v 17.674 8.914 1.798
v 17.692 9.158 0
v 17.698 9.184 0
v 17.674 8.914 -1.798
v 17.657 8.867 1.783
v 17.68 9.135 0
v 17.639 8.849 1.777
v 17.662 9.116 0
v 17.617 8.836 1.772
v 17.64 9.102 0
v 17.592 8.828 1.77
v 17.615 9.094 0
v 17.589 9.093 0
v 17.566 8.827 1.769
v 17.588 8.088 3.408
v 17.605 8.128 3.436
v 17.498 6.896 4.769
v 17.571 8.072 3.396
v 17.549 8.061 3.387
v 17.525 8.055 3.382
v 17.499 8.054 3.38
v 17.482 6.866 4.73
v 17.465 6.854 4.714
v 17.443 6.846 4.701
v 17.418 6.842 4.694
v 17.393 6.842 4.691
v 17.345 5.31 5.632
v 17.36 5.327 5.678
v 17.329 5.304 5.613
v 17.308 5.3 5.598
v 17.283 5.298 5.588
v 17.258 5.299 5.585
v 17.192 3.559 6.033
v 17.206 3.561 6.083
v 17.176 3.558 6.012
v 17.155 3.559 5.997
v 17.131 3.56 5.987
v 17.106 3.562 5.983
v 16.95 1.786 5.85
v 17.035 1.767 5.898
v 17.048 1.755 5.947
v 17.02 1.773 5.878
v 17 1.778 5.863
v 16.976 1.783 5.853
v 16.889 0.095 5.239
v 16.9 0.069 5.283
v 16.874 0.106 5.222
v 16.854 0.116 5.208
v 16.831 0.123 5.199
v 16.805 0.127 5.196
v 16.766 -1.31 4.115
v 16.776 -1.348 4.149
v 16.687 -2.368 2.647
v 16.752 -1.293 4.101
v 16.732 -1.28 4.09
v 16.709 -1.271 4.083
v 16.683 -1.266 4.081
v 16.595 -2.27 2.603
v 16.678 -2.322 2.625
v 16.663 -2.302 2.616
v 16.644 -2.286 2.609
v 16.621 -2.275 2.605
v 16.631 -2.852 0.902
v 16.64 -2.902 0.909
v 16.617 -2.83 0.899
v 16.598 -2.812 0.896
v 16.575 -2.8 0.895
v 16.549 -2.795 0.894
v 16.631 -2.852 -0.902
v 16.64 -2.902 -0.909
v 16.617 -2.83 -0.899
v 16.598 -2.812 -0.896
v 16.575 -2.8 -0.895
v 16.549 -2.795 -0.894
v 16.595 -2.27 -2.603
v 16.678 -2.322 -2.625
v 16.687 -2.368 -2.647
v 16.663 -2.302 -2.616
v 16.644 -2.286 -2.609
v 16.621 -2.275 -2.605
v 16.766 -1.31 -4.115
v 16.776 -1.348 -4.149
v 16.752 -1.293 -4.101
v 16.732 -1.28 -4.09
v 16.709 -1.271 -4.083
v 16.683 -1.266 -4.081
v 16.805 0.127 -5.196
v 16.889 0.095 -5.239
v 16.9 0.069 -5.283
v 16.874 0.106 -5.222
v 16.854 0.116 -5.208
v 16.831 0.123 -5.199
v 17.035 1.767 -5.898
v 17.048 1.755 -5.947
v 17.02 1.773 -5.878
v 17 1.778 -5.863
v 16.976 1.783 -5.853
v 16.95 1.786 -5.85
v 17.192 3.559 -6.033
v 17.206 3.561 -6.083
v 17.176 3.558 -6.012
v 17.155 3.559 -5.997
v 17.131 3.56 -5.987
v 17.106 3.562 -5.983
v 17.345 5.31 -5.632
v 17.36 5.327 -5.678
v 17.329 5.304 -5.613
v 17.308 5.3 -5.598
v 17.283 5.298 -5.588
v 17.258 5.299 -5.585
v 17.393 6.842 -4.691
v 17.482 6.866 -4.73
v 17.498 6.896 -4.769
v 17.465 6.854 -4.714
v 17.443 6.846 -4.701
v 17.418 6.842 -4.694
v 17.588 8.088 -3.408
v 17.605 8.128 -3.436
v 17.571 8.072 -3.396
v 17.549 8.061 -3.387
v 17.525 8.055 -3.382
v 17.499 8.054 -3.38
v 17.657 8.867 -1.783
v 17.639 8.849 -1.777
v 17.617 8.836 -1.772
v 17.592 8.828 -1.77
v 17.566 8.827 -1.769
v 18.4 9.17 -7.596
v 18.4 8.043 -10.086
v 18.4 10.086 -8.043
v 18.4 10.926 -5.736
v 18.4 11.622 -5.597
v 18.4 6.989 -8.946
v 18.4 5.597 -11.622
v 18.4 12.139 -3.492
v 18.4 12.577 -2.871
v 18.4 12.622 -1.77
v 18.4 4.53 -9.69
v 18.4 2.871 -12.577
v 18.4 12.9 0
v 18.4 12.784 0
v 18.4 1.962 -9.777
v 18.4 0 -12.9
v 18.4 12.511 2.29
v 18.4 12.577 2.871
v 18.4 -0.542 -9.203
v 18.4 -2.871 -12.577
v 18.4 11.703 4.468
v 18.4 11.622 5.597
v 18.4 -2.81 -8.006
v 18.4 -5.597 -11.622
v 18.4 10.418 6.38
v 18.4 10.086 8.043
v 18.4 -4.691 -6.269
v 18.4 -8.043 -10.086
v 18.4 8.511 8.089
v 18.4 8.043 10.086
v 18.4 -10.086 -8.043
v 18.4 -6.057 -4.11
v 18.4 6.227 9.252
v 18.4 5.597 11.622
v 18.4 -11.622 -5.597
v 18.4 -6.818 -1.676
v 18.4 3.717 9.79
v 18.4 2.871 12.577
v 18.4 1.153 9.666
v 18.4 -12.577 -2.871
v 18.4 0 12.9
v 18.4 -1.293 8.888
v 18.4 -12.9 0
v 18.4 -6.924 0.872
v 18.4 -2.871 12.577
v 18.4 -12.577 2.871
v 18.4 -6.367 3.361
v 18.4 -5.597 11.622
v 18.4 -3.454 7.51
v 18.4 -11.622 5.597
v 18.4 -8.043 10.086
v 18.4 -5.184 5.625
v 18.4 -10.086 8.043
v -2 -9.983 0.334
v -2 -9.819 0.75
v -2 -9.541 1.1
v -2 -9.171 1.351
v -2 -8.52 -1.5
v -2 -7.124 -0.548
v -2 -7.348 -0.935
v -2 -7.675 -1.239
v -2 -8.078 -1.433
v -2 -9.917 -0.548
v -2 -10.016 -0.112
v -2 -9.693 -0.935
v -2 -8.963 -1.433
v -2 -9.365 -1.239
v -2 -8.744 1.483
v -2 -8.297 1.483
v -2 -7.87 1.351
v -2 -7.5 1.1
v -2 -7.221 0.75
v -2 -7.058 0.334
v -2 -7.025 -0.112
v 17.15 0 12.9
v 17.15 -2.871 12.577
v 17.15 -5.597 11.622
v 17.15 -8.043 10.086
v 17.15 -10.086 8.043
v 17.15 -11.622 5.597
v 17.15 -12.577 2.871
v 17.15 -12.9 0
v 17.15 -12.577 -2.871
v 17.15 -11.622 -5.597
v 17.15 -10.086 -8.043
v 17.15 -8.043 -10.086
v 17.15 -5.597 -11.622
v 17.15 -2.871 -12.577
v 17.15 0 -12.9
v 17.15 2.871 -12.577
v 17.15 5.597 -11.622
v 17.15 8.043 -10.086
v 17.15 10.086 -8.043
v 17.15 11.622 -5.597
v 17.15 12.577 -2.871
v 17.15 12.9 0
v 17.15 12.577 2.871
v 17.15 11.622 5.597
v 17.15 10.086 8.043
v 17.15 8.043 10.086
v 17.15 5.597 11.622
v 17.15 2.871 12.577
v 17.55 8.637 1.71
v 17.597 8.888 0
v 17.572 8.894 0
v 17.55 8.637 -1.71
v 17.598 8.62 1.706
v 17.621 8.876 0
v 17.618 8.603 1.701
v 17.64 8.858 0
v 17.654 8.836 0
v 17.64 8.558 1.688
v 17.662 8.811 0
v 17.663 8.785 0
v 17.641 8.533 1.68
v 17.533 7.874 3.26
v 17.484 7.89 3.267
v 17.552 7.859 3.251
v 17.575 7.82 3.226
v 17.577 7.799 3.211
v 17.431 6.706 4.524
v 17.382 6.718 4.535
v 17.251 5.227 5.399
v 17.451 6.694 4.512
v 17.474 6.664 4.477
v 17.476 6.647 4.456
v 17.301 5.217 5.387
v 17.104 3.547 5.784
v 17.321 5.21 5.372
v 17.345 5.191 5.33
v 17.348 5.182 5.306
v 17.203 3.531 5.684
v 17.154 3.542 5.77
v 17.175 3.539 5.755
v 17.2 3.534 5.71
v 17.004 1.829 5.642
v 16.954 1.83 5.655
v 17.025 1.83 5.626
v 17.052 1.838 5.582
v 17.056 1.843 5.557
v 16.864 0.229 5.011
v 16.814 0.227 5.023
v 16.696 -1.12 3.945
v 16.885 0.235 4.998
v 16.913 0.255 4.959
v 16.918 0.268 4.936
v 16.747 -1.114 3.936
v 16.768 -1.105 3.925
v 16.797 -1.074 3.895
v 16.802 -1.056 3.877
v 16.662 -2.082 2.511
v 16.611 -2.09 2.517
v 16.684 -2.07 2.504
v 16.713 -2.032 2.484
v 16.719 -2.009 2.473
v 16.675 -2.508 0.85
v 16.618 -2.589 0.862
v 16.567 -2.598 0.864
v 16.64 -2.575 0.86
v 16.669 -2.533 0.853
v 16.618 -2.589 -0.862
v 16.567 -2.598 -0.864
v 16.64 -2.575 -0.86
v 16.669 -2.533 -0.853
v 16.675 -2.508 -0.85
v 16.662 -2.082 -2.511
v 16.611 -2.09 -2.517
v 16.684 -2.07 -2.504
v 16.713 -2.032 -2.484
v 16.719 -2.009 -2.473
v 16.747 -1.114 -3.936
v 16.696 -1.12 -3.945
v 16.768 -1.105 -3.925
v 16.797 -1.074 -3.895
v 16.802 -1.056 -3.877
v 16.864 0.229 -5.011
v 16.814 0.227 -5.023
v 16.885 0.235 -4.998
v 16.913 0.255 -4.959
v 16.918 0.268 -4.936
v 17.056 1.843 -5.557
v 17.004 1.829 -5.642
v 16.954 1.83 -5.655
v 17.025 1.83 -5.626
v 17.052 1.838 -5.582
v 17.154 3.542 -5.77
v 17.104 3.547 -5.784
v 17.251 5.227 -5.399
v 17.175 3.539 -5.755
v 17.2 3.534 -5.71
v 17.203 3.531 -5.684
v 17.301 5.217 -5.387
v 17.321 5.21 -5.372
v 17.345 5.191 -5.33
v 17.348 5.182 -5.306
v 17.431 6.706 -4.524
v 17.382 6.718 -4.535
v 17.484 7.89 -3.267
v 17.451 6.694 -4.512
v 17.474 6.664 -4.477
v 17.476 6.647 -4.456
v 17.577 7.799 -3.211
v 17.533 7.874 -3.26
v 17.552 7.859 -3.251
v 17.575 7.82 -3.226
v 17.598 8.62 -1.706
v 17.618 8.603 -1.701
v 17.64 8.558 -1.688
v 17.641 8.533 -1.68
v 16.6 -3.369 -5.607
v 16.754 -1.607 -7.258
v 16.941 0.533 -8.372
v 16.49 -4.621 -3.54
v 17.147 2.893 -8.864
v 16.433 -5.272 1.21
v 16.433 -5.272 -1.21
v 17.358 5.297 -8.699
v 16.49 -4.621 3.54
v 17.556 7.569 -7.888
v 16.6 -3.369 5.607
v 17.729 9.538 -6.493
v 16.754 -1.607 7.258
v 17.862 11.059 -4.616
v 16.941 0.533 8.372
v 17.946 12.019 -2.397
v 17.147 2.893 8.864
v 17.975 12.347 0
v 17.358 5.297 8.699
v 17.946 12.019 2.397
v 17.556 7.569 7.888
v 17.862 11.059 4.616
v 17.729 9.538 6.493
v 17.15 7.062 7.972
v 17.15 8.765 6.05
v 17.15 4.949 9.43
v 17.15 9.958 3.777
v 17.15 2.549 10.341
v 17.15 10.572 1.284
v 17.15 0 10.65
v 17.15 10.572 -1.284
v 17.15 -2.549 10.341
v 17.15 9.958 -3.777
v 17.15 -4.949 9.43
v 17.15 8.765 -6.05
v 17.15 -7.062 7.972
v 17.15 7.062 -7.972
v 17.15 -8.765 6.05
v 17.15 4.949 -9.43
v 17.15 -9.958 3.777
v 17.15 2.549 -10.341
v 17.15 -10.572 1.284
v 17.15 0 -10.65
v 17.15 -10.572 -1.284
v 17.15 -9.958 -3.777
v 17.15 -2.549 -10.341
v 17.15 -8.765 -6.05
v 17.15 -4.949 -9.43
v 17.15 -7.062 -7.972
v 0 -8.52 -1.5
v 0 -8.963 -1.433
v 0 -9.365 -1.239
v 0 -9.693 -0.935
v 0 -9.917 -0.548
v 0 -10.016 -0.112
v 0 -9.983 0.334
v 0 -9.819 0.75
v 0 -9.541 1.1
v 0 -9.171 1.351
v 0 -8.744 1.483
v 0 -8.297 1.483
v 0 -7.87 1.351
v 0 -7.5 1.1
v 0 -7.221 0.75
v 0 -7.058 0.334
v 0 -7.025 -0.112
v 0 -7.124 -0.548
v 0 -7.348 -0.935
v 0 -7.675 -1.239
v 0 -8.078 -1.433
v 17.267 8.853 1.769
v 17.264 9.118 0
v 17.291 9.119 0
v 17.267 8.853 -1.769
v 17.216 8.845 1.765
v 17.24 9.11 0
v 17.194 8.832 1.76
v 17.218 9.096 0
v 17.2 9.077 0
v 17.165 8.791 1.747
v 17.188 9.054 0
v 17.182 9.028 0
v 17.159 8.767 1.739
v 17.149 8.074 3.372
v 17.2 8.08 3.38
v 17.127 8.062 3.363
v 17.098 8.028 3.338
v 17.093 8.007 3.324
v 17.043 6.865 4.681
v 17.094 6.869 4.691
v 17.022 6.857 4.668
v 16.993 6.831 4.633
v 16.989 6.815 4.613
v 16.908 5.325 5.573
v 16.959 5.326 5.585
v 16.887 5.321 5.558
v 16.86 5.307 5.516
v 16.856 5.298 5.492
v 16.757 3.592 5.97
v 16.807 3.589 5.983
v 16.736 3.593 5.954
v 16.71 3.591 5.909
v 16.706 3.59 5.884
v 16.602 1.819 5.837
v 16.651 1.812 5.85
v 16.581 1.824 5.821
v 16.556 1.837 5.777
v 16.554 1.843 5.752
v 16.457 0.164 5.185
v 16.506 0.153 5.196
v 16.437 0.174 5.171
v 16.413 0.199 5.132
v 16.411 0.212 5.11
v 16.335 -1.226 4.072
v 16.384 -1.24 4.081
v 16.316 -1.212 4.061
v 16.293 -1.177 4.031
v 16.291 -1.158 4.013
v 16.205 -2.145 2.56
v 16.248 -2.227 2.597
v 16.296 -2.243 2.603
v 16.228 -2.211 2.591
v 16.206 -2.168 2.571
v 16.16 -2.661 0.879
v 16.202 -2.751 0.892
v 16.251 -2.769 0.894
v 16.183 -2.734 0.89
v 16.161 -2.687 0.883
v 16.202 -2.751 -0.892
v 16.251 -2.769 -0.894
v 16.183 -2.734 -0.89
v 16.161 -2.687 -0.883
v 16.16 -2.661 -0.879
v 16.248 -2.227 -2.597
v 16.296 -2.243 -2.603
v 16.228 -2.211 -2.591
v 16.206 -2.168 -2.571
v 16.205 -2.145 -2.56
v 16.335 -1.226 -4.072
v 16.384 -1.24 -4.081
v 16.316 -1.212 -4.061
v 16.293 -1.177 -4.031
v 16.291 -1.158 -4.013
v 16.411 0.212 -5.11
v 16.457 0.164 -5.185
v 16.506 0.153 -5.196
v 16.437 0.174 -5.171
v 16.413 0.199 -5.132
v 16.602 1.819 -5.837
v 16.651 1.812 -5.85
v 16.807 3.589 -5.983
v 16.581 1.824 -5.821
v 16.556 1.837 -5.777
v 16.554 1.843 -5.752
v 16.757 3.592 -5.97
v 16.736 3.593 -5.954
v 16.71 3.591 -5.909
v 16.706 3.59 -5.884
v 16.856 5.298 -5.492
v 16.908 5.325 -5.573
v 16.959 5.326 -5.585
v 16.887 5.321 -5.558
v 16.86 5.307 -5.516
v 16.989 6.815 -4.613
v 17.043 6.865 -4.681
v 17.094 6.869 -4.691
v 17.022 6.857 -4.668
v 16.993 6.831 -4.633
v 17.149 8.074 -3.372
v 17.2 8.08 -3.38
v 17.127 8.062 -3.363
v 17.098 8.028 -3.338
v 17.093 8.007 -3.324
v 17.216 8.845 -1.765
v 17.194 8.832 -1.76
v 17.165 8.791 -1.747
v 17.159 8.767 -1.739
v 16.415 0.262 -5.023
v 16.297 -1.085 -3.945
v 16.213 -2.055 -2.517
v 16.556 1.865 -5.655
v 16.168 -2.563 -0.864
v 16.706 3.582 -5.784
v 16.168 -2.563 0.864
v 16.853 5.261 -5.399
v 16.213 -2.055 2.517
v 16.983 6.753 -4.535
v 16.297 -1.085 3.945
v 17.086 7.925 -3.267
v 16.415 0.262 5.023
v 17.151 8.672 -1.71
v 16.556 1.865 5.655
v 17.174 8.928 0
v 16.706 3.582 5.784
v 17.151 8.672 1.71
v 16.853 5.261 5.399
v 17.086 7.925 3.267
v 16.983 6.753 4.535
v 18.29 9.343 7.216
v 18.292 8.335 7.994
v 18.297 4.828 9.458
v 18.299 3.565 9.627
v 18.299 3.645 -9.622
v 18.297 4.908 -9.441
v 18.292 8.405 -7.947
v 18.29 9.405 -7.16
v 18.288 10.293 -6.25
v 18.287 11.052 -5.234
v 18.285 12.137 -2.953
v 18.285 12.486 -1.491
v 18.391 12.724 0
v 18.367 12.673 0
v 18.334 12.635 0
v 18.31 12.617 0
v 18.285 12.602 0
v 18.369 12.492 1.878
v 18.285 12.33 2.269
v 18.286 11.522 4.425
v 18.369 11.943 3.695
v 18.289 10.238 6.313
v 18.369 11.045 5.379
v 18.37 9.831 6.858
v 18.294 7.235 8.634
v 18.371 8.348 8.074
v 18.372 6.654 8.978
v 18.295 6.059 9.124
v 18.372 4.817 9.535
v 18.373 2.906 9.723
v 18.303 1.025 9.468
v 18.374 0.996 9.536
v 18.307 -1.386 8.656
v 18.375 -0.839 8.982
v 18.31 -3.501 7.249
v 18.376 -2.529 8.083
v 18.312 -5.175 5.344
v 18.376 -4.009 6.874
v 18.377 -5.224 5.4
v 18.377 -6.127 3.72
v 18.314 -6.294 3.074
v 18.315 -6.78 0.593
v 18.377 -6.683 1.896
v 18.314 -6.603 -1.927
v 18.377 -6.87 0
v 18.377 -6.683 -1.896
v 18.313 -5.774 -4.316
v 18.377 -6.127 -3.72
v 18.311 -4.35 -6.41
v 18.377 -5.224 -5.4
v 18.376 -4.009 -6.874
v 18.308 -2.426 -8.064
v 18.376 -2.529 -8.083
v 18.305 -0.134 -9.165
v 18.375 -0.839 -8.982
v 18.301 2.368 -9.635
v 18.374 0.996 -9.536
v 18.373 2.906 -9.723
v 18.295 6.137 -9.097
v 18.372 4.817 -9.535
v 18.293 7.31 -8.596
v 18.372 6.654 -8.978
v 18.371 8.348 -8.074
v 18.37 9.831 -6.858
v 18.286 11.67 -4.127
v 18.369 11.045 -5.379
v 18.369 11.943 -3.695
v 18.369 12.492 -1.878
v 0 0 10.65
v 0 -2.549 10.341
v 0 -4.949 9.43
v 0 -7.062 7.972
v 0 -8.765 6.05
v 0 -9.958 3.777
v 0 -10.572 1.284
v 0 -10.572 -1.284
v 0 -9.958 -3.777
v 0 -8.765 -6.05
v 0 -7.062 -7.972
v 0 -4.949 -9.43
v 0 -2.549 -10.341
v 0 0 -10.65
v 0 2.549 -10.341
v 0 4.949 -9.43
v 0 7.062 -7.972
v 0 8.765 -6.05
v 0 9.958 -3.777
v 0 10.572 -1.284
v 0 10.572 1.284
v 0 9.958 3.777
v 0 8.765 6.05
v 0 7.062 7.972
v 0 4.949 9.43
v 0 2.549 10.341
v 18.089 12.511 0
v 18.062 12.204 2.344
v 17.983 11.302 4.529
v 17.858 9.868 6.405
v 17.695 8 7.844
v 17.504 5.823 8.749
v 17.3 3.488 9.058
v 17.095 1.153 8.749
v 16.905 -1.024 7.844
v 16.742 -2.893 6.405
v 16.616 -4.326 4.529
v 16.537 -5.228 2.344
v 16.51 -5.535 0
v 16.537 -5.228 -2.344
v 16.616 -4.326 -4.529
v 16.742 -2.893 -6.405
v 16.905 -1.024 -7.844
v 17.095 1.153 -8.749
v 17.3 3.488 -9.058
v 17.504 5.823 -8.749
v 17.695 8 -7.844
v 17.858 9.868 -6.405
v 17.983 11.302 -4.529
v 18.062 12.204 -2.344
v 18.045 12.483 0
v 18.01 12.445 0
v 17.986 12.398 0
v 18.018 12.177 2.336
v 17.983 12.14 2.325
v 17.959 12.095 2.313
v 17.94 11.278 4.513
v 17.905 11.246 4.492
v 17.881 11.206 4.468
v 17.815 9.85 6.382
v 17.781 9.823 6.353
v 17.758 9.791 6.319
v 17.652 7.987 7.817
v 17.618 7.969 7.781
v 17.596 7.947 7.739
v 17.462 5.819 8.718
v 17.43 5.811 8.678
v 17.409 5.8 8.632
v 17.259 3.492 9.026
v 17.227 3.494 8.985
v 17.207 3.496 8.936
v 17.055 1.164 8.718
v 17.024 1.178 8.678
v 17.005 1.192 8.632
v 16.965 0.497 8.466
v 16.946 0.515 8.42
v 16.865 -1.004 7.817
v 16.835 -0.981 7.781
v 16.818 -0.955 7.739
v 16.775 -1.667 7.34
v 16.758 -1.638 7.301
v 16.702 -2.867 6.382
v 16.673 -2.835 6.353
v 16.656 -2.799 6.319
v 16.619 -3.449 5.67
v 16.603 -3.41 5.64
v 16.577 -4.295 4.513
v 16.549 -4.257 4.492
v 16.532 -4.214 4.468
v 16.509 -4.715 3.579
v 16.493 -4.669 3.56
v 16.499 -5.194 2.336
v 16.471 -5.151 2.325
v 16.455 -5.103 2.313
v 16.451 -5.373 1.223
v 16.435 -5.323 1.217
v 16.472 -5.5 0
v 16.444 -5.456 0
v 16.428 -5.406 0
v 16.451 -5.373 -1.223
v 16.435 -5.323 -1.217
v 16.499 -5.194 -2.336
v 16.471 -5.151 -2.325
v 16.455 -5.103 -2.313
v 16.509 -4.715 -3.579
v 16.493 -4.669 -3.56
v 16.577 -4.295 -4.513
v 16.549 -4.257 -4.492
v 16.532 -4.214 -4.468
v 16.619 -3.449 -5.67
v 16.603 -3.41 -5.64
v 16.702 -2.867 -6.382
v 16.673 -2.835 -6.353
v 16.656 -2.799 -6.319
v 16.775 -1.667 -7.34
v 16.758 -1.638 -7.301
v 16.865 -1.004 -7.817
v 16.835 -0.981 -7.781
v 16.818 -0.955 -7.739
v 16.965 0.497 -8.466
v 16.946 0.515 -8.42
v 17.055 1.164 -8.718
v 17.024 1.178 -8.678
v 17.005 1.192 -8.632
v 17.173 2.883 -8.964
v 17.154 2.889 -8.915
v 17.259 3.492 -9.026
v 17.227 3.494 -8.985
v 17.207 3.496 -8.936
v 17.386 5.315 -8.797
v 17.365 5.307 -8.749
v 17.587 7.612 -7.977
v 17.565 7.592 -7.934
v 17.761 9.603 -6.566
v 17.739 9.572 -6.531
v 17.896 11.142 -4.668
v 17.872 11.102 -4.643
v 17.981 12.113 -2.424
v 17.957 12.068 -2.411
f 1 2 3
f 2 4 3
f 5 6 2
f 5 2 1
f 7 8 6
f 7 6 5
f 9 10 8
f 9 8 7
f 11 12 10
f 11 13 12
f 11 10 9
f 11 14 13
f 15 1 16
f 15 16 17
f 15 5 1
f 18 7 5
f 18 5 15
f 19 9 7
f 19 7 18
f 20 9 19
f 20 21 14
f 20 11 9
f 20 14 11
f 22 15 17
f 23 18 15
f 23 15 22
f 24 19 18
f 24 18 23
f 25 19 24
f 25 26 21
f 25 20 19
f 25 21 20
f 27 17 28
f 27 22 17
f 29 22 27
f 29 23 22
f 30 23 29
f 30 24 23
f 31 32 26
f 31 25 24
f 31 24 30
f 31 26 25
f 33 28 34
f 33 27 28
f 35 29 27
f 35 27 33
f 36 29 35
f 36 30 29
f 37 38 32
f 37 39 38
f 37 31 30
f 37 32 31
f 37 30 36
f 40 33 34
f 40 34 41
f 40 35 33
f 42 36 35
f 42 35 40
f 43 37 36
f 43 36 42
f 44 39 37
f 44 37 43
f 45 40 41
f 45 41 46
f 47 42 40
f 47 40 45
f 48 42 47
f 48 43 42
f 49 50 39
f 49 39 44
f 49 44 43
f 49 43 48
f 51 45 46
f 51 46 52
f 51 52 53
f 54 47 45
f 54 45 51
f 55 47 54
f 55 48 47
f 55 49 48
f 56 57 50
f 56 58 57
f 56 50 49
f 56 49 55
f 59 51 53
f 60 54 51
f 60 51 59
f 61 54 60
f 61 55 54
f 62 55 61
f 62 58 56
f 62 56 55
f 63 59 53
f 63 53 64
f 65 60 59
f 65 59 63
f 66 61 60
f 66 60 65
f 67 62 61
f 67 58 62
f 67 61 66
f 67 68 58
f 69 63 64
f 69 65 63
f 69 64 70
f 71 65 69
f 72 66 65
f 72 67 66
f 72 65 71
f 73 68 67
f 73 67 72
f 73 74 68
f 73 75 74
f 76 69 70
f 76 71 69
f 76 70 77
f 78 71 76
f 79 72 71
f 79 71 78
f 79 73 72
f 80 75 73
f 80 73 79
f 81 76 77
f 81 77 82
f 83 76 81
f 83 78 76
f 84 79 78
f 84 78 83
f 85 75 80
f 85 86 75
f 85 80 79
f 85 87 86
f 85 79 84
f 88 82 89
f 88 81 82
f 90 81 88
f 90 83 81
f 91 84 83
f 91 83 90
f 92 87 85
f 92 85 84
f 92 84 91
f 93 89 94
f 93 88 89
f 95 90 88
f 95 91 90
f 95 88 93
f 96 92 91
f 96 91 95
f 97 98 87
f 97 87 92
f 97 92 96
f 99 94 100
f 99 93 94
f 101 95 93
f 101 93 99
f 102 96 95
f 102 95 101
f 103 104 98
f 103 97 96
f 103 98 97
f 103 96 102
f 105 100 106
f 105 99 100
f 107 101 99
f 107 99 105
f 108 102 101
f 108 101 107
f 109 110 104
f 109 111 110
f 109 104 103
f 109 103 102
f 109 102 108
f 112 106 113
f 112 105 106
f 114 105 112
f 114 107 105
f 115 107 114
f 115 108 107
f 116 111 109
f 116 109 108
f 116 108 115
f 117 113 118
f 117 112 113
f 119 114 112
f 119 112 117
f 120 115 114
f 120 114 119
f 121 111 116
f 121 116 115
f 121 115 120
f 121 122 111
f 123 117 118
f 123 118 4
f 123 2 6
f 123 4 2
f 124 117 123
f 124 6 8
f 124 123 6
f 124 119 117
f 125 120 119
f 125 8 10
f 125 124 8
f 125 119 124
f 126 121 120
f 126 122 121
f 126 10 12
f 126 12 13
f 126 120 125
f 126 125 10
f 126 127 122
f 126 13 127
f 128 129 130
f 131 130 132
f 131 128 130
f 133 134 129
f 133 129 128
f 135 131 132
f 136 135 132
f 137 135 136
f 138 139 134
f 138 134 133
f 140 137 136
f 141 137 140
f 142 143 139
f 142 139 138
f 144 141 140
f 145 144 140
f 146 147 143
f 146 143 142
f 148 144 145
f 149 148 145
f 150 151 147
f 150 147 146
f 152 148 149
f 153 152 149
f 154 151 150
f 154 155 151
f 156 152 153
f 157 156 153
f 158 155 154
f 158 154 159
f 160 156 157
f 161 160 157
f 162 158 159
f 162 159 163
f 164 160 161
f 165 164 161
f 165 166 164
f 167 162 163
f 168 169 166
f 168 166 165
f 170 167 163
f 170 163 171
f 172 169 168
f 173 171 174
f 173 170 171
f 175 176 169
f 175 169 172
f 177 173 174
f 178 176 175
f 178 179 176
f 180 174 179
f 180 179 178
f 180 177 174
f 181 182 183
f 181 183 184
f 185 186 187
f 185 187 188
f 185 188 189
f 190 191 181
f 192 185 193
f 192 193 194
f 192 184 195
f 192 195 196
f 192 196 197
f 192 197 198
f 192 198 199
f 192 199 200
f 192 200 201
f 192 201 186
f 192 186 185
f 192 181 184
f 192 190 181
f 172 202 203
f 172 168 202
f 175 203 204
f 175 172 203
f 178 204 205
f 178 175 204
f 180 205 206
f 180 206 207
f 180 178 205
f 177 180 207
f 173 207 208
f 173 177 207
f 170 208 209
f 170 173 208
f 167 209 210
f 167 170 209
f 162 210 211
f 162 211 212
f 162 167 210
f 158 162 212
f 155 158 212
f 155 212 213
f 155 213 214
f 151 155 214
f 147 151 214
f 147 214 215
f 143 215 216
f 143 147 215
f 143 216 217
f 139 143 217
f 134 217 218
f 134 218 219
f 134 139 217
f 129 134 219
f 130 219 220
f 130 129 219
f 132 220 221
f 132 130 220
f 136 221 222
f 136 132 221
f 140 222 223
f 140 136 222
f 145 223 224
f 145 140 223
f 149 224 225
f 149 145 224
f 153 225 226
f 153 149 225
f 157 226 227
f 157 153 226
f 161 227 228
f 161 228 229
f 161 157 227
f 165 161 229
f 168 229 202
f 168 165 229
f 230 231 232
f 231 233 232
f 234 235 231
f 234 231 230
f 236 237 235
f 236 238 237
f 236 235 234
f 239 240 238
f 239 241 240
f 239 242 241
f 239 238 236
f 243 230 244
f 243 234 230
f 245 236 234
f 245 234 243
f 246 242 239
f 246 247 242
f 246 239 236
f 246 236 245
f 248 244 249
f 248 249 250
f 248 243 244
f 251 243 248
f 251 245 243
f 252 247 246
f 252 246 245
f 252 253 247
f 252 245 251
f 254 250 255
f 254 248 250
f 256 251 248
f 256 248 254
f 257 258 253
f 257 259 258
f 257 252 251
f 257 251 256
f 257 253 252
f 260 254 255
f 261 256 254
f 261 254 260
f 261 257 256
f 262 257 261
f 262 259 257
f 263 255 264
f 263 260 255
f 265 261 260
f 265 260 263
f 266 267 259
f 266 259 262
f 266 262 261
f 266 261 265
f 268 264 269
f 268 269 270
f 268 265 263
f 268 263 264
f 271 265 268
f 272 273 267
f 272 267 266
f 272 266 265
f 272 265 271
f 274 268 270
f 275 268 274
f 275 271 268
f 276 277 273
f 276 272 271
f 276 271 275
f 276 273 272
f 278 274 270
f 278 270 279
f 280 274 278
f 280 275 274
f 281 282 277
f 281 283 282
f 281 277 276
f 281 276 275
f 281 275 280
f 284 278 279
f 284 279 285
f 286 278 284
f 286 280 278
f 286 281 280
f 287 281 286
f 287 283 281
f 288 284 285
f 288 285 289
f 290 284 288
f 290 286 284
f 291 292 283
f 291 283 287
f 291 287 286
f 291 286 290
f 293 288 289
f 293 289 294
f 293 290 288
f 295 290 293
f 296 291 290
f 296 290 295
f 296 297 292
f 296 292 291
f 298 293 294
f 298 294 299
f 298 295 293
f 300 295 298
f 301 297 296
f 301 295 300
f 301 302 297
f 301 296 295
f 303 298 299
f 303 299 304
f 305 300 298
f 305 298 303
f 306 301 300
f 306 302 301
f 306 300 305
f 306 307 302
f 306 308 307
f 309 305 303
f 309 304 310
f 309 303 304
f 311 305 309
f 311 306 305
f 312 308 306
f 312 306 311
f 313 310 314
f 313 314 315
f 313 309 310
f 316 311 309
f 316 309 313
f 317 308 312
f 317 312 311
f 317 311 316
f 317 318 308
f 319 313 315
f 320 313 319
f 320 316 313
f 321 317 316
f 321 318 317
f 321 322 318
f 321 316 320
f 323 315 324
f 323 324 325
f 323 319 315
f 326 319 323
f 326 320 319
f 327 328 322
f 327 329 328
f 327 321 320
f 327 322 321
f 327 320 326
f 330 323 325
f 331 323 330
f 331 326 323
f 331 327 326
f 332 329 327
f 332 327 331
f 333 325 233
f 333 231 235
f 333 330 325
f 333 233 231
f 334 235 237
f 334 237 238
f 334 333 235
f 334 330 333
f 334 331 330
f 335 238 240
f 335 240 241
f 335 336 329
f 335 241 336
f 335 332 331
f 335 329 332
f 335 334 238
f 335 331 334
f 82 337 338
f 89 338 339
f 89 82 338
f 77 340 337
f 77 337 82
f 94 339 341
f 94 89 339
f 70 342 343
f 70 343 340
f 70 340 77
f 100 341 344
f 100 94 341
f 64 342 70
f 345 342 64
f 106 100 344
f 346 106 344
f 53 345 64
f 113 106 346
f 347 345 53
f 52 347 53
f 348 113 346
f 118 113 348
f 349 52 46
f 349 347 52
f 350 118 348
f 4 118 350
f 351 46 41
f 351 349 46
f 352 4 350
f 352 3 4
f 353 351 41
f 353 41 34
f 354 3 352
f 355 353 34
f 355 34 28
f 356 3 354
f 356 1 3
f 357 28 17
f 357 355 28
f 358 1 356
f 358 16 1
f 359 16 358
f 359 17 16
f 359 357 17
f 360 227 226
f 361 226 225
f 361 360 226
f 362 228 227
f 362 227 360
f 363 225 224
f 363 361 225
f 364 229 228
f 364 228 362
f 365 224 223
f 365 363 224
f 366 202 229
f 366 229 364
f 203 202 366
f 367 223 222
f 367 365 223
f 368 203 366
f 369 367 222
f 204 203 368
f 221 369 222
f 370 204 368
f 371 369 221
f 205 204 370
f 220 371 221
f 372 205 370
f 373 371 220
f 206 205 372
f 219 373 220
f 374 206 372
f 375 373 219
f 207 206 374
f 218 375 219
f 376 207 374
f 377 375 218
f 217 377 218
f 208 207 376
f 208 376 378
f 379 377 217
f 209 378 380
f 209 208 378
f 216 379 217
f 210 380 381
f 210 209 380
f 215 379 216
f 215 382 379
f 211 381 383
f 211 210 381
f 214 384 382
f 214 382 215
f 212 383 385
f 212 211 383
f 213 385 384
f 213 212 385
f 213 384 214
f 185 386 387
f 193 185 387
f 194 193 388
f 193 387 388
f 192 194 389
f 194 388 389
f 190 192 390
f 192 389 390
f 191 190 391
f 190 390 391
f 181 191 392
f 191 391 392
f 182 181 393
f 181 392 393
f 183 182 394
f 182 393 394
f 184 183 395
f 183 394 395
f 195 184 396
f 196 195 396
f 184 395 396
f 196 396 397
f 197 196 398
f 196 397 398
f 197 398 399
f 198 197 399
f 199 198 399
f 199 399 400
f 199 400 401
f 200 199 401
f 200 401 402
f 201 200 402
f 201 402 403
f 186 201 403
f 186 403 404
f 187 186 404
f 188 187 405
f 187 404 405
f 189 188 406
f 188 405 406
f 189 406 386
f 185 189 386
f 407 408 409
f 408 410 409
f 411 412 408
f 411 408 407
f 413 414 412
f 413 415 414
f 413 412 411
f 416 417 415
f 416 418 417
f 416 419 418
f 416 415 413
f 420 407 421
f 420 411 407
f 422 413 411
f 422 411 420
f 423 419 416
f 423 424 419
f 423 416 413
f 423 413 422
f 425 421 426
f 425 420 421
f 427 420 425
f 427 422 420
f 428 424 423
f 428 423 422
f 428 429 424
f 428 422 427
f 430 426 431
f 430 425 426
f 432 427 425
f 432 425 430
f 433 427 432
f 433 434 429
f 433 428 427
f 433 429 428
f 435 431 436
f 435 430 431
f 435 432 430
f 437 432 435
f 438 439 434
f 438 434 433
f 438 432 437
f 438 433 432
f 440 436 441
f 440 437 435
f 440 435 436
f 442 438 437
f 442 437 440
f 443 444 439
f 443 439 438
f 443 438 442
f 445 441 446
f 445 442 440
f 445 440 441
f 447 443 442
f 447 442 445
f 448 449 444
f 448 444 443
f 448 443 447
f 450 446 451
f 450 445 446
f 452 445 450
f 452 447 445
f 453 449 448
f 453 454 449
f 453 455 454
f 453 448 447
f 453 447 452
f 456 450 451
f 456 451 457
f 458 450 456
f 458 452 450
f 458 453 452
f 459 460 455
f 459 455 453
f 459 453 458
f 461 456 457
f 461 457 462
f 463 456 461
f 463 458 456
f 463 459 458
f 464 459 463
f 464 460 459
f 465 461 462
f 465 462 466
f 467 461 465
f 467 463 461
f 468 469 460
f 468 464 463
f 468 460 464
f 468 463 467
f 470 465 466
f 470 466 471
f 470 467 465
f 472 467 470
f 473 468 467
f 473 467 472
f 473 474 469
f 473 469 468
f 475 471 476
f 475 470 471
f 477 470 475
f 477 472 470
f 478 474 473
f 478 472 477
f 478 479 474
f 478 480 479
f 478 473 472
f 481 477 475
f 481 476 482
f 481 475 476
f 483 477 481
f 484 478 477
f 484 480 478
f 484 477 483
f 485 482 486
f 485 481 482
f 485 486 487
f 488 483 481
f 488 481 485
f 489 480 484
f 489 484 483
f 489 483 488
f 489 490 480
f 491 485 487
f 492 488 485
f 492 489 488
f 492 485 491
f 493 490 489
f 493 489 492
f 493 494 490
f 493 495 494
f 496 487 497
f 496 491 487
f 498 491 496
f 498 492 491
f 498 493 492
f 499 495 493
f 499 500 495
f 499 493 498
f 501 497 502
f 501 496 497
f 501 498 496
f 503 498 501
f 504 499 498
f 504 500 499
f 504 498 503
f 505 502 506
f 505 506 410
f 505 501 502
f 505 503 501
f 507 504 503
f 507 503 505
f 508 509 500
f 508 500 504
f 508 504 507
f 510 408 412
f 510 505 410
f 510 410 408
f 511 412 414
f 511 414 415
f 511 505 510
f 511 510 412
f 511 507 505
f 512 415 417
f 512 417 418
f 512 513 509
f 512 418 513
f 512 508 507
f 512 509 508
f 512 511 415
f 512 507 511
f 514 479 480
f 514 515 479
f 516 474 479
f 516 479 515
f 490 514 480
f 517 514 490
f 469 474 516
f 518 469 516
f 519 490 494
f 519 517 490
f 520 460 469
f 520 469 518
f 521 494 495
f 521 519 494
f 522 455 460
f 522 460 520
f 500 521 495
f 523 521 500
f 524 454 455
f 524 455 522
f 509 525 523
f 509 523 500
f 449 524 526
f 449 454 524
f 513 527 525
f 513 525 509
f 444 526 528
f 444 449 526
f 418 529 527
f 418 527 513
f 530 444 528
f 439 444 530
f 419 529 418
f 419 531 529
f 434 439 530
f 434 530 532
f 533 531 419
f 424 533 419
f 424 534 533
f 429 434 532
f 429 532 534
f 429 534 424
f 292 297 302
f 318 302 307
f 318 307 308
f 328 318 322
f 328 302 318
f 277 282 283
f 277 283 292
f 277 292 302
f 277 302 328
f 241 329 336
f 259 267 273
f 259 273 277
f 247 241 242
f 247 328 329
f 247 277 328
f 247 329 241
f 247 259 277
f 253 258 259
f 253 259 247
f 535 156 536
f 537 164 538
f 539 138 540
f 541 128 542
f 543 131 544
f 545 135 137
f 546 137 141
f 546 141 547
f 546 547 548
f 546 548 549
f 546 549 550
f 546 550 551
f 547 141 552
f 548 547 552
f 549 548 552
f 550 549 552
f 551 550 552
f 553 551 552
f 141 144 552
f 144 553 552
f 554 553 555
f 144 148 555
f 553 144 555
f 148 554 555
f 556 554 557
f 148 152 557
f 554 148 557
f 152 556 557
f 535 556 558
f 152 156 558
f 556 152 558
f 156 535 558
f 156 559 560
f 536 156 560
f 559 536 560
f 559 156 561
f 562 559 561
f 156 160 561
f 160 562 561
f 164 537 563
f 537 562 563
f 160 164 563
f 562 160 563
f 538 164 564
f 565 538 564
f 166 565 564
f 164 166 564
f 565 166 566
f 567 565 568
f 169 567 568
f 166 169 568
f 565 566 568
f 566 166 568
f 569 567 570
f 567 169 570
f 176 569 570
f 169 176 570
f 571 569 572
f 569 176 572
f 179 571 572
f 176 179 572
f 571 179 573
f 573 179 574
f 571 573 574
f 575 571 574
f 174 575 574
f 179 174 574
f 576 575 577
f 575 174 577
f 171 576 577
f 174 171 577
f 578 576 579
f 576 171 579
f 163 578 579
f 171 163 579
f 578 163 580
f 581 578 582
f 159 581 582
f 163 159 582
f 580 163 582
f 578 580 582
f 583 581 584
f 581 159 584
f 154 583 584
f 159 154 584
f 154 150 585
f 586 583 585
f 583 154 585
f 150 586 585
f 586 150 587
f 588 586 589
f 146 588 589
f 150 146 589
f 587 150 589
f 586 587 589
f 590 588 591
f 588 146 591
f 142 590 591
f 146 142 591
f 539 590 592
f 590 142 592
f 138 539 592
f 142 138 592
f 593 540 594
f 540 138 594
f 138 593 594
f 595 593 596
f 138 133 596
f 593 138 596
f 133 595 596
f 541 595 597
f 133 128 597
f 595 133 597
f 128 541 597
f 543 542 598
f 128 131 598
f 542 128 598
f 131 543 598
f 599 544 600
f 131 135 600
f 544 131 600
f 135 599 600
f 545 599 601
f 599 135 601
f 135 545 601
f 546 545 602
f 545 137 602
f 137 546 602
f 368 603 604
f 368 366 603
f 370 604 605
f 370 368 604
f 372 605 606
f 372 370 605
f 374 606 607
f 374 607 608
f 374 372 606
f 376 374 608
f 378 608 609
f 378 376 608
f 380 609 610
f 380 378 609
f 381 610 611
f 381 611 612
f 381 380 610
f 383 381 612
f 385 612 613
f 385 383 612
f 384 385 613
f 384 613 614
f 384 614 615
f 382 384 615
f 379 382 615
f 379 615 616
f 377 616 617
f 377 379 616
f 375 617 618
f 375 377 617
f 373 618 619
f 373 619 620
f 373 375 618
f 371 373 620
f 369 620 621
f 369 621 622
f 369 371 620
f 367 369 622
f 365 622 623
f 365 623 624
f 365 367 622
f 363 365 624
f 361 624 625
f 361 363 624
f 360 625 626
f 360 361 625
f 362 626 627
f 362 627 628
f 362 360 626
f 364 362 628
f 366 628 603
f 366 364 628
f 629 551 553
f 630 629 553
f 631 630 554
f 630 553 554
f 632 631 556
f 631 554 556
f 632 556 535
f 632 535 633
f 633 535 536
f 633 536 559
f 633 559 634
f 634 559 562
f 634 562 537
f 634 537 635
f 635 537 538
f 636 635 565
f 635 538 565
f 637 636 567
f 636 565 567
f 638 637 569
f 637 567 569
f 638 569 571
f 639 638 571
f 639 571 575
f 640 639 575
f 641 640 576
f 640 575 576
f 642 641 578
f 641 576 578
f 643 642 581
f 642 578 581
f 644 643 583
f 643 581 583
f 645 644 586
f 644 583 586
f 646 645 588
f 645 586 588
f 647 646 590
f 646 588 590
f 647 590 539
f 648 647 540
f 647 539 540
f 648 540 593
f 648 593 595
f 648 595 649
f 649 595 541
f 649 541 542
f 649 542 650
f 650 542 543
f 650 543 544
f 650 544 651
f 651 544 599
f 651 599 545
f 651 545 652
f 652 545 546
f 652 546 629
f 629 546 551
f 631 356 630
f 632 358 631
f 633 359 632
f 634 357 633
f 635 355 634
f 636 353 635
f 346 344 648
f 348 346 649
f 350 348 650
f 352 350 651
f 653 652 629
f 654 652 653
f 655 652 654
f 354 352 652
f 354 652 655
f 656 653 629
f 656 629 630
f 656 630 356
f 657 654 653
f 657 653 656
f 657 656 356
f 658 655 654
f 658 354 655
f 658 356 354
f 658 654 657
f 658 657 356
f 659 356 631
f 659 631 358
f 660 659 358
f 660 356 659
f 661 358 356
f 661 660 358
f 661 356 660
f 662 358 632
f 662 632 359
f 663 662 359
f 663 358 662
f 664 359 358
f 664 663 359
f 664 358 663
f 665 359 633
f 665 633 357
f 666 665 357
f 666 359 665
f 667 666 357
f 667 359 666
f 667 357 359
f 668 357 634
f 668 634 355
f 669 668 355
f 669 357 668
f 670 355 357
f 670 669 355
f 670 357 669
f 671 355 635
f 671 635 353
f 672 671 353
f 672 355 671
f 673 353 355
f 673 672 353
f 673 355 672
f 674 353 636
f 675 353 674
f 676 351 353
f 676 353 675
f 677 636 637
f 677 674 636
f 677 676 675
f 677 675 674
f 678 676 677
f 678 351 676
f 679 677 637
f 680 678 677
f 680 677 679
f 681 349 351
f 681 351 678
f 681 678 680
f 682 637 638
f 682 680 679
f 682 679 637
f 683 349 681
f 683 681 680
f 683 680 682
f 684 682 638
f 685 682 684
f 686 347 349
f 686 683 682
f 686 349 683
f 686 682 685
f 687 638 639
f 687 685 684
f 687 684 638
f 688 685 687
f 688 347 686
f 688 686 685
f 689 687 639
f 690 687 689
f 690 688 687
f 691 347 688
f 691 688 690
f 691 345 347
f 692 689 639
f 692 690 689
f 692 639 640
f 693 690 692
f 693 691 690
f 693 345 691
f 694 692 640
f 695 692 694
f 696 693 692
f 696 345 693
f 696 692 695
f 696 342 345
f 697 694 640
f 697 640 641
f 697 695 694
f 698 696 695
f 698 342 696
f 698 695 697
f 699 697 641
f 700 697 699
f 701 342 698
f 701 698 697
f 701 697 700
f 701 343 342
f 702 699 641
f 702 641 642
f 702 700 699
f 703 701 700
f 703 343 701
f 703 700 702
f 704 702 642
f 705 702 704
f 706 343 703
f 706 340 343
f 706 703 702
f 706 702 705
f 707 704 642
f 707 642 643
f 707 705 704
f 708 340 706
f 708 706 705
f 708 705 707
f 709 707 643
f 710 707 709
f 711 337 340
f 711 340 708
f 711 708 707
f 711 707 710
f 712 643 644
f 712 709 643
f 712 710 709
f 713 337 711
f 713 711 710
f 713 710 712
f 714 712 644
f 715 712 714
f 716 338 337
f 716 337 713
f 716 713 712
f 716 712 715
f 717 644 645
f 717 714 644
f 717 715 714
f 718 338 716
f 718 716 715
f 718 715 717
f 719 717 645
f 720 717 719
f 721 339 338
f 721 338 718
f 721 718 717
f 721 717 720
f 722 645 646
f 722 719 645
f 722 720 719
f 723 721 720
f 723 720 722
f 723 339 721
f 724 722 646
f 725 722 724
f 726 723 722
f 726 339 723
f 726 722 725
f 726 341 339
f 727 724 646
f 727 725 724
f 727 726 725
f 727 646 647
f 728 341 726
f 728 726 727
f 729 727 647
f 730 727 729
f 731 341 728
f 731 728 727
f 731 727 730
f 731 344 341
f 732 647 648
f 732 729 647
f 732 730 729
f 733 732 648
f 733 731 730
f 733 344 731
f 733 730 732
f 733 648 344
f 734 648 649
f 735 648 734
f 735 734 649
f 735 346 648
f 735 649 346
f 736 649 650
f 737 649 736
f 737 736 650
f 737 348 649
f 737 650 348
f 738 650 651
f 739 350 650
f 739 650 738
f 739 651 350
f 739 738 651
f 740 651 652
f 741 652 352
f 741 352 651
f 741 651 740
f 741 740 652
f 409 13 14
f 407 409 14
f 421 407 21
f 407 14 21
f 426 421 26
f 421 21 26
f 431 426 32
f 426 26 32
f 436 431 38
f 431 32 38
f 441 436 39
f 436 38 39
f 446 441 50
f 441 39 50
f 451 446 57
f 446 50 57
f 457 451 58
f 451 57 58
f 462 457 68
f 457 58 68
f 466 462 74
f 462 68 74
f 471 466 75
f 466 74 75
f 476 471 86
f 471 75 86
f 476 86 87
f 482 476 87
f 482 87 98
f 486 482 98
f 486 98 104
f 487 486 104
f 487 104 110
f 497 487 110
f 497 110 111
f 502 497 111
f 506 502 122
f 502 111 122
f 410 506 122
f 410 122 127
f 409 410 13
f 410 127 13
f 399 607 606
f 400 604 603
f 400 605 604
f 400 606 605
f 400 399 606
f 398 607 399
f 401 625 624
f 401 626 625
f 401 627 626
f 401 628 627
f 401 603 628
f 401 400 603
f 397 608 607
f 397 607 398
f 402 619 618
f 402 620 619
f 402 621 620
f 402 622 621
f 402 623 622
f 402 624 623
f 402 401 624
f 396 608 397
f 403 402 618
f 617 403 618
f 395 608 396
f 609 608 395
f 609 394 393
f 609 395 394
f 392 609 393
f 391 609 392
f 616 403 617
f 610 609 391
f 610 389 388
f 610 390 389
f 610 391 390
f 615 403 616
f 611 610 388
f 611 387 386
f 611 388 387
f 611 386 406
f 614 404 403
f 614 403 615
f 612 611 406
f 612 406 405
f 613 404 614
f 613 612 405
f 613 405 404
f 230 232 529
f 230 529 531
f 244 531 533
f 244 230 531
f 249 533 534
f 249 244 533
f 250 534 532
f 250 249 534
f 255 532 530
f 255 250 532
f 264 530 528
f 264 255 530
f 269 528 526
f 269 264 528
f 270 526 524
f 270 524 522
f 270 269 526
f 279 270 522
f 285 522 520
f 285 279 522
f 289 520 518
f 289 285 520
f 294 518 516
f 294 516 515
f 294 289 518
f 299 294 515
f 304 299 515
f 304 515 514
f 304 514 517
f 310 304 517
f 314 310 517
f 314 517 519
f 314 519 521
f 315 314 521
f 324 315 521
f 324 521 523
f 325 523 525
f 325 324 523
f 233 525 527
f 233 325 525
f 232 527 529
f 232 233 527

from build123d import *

# Parameters (mm, degrees)
CUT_EXTRUDE_1_DEPTH      = 27.64630158
CUT_EXTRUDE_1_DEPTH_BACK = 1.5
SKETCH_2_R               = 9
FILLET_1_R               = 0.2
SKETCH_3_R               = 6
SKETCH_3_R_2             = 5.8
CUT_EXTRUDE_2_DEPTH      = 0.5
FILLET_2_R               = 0.1
SKETCH_4_R               = 1.5
EXTRUDE_1_DEPTH          = 2


# Read off the part's stored shape, not the designer's step: Уклон1
with BuildPart() as part:
    # Эскиз1 → Повернуть1 (revolve)
    with BuildSketch(Plane.XY, mode=Mode.PRIVATE) as revolve_1_sk:
        Polygon((0, 0), (0, 10.65), (17.15, 10.65), (17.15, 12.9), (18.4, 12.9), (18.4, 0), align=None)
    revolve(revolve_1_sk.sketch.rotate(Axis((0, 0, 0), (1, 0, 0)), 90), axis=Axis((0, 0, 0), (1, 0, 0)))

    # Эскиз2 → Вырез-Вытянуть1 (cut, two sides: drawn at the far end of the back side and taken through both)
    with BuildSketch(Plane(origin=(18.260231328, -1.597563235, 0), x_dir=(0, 0, -1), z_dir=(0.9961946980917455, -0.08715574274765836, 0)).offset(-CUT_EXTRUDE_1_DEPTH_BACK)):
        with Locations(Location((0, 4.982416031, 0), (0, 0, 90))):
            Circle(SKETCH_2_R)
    extrude(amount=CUT_EXTRUDE_1_DEPTH + CUT_EXTRUDE_1_DEPTH_BACK, mode=Mode.SUBTRACT)

    # Уклон1 outline → Уклон1 (revolve, cut)
    with BuildSketch(Plane(origin=(0.43424617, 4.963456434, 0), x_dir=(0.08715574274765836, 0.9961946980917454, 0), z_dir=(0, 0, -1))):
        Polygon((9, 16.829982445), (10.211394412, 18.928179115), (9, 18.928179115), align=None)
    revolve(axis=Axis((0.43424617, 4.963456434, 0), (0.9961946980917454, -0.08715574274765836, 0)), mode=Mode.SUBTRACT)

    # Скругление1
    fillet_1_edges = [part.edges().sort_by_distance(p)[0] for p in [
        (16.415783766, -5.469125469, 0),
        (18.4, -6.858488634, -5.8e-08),
    ]]
    fillet(fillet_1_edges, radius=FILLET_1_R)

    # Эскиз3 → Вырез-Вытянуть2 (cut)
    with BuildSketch(Plane(origin=(16.765939281, -1.46682962, 0), x_dir=(0, 0, -1), z_dir=(0.9961946980917457, -0.08715574274765837, 0))):
        with Locations(Location((0, 4.591293403, 0), (0, 0, 90))):
            Circle(SKETCH_3_R)
        with Locations(Location((0, 4.591293403, 0), (0, 0, 90))):
            Circle(SKETCH_3_R_2, mode=Mode.SUBTRACT)
    extrude(amount=-CUT_EXTRUDE_2_DEPTH, mode=Mode.SUBTRACT)

    # Скругление2
    fillet_2_edges = [part.edges().sort_by_distance(p)[0] for p in [
        (16.145065062, -2.826597792, 0),
        (16.643162411, -2.870175664, 0),
        (16.660593559, -2.670936724, 0),
    ]]
    fillet(fillet_2_edges, radius=FILLET_2_R)

    # Эскиз4 → Бобышка-Вытянуть1 (add)
    with BuildSketch(Plane.ZY):
        with Locations(Location((0, -8.520441642, 0), (0, 0, 180))):
            Circle(SKETCH_4_R)
    extrude(amount=EXTRUDE_1_DEPTH)


solid = part.part
